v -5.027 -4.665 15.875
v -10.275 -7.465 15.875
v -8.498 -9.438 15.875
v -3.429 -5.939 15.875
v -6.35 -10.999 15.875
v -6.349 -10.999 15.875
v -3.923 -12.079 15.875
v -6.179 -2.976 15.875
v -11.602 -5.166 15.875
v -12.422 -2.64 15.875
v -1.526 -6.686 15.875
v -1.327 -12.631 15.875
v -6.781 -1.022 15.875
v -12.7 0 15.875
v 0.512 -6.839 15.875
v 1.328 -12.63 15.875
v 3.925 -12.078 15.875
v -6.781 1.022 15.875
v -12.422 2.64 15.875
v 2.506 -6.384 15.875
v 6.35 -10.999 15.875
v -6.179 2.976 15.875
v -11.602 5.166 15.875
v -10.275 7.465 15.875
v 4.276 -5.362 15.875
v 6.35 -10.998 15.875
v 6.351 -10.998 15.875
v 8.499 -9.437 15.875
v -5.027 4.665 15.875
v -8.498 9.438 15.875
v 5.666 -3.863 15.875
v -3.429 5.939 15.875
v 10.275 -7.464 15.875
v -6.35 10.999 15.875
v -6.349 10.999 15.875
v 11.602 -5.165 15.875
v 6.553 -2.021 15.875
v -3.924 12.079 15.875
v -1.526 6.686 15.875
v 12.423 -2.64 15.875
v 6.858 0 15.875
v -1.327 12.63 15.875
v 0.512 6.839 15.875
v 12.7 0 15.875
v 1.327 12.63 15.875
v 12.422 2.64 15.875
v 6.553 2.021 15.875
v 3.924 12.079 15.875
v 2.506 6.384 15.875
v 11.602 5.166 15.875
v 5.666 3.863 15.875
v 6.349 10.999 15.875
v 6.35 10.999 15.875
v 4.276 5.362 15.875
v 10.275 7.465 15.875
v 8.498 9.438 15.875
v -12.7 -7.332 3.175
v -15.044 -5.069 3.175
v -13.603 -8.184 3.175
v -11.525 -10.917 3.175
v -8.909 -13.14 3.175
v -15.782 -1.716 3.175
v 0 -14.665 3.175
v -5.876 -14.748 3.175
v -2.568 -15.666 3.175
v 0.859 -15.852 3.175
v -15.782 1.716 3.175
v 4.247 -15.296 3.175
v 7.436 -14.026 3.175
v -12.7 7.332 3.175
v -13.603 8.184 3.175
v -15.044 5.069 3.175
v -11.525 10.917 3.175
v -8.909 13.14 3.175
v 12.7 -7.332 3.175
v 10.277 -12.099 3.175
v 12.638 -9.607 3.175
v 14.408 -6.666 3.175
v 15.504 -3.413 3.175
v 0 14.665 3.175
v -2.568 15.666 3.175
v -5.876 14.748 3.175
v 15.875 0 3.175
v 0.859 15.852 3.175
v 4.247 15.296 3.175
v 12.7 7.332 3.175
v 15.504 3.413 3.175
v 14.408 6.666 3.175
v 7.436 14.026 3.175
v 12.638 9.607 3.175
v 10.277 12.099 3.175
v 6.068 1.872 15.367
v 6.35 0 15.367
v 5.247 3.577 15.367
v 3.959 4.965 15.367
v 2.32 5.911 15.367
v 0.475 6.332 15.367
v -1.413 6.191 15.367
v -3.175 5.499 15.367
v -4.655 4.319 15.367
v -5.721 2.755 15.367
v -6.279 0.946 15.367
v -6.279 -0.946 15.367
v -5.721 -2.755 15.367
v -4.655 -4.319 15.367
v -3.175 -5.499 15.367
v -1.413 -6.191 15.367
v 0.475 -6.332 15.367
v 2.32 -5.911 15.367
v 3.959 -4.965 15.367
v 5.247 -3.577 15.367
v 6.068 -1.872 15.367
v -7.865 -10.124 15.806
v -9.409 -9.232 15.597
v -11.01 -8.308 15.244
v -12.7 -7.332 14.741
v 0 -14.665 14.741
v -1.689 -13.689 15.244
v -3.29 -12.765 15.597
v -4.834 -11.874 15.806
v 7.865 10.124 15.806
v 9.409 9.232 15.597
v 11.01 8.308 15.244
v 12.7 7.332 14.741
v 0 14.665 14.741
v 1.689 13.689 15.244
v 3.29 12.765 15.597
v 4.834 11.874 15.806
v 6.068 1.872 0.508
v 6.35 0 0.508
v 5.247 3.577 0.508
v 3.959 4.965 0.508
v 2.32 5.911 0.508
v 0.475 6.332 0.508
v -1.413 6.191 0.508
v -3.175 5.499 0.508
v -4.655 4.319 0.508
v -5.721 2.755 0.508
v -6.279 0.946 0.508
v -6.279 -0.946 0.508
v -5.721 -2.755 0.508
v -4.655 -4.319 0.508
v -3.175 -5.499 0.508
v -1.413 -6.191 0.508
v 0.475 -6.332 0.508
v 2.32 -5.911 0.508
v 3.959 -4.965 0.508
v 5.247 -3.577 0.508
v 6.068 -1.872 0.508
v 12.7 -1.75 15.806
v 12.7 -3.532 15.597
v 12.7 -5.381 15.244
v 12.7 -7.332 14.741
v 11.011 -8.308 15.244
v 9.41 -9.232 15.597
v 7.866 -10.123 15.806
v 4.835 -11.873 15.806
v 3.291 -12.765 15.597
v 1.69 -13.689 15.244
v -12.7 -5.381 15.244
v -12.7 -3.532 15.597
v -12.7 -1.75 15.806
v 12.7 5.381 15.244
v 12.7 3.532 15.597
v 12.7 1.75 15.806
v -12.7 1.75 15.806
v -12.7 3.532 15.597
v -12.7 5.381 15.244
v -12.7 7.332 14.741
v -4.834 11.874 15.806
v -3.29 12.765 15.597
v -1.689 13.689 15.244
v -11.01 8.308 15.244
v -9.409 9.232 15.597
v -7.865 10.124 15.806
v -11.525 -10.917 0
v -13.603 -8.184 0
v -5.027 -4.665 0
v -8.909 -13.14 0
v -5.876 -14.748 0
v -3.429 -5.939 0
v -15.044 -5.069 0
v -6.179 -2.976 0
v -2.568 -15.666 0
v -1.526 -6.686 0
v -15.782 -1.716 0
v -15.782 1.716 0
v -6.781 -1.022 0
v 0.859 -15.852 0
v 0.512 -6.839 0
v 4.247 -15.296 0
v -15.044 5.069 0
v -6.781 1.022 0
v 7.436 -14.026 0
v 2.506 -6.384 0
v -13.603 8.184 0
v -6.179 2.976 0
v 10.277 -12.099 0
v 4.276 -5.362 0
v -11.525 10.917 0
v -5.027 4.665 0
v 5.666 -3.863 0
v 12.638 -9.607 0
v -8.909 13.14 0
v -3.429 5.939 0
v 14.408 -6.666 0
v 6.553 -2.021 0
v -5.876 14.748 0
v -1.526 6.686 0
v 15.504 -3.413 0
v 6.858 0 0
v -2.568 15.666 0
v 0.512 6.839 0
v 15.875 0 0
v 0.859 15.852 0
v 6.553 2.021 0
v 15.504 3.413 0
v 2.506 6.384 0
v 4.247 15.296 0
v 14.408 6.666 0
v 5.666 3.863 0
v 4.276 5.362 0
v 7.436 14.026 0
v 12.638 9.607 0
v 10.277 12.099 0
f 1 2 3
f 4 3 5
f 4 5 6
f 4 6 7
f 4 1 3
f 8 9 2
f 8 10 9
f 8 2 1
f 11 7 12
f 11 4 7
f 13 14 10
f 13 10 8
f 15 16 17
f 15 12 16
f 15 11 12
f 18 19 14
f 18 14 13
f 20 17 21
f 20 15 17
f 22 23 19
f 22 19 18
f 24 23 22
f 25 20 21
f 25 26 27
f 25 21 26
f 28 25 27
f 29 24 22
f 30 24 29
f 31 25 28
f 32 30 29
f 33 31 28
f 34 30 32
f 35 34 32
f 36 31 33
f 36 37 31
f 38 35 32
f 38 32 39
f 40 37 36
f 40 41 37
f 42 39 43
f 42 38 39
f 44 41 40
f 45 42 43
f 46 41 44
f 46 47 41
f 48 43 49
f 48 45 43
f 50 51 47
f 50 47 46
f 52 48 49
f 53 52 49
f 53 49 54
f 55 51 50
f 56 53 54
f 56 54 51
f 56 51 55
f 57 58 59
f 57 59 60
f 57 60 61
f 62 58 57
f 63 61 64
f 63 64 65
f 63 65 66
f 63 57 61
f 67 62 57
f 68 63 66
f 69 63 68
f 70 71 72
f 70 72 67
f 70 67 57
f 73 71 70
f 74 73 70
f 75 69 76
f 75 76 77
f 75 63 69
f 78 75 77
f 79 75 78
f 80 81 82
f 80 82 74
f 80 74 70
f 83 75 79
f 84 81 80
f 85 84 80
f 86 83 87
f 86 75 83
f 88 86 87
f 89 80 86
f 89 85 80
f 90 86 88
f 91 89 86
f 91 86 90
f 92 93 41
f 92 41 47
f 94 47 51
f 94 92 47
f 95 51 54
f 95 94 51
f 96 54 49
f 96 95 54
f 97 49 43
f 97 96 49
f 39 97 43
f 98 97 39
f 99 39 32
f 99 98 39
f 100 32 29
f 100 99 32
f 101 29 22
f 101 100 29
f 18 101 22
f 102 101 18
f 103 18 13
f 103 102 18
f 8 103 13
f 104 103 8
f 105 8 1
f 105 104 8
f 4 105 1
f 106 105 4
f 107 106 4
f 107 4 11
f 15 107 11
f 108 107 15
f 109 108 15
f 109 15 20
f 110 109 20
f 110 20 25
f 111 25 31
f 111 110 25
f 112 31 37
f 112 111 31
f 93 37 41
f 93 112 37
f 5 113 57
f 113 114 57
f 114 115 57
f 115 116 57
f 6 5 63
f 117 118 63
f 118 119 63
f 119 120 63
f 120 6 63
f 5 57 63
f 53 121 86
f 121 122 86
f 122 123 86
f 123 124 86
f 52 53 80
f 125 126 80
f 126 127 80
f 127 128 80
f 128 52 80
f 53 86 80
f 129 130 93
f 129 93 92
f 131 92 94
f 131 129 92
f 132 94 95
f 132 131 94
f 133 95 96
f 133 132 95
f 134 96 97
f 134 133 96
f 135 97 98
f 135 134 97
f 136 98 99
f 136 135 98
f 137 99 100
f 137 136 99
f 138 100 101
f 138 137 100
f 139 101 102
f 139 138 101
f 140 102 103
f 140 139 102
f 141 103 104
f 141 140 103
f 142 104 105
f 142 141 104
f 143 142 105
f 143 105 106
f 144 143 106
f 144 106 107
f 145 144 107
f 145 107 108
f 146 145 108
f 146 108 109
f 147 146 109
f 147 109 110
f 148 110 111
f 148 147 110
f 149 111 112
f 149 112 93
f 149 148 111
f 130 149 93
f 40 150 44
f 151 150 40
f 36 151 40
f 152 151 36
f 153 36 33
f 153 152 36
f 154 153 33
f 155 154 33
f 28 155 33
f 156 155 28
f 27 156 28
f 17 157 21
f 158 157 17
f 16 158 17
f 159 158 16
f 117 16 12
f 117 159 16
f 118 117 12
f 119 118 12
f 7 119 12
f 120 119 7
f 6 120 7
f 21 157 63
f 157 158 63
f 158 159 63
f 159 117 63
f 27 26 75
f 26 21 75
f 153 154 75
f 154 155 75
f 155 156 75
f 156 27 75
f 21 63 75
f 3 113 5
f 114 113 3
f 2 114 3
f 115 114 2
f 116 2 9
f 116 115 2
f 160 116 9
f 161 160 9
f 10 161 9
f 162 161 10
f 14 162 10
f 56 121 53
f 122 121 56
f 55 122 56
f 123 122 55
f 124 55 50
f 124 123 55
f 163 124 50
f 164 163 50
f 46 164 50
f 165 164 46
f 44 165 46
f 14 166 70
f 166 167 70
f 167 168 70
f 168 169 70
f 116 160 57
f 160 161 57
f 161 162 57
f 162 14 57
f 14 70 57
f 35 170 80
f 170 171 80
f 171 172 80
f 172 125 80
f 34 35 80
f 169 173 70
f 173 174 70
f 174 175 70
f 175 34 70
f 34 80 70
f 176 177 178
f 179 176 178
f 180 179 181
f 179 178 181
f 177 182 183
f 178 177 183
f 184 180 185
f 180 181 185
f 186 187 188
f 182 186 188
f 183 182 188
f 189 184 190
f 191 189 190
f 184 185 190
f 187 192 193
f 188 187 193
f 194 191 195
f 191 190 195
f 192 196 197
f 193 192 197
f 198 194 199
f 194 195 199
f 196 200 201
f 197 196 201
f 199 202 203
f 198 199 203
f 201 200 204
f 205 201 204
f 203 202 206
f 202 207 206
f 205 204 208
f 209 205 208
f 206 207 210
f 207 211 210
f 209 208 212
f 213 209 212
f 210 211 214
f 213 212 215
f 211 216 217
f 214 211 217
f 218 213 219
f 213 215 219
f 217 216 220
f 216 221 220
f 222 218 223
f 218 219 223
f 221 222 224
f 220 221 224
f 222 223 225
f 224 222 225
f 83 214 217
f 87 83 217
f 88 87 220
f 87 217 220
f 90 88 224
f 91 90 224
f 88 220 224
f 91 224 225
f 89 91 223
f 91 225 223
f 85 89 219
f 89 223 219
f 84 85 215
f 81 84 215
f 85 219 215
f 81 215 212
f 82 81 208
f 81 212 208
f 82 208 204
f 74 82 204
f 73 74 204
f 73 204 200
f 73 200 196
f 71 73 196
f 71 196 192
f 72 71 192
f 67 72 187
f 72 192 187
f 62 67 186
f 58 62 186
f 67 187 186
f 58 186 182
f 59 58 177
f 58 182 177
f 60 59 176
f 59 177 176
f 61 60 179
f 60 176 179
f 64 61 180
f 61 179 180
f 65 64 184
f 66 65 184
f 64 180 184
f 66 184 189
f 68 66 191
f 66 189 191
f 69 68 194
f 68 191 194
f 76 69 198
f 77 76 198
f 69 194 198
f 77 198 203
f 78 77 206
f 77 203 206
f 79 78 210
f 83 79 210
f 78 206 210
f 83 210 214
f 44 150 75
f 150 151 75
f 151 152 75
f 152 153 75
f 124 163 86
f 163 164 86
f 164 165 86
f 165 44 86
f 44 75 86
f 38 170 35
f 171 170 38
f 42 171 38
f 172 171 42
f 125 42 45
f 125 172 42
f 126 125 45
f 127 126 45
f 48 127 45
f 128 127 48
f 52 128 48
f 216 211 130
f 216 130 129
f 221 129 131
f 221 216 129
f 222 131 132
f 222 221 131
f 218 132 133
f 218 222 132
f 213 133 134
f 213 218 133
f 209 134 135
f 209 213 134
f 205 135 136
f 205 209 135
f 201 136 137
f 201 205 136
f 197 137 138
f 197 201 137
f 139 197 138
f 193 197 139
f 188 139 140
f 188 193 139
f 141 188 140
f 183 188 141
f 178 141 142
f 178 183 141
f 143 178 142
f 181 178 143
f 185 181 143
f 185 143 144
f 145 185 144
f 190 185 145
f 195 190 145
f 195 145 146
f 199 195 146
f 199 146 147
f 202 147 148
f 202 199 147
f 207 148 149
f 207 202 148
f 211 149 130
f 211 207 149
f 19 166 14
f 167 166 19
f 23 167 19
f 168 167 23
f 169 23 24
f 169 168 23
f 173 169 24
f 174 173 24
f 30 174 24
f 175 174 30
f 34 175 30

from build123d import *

# Parameters (mm, degrees)
F0_R     = 6.35
F1_DEPTH = 15.875
F4_R     = 15.875
F4_R_2   = 6.35
F5_DEPTH = 3.175
F6_SIZE  = 0.508


with BuildPart() as f1:
    # F0 (on Top) → F1 (new body)
    with BuildSketch(Plane.XY):
        Polygon((12.7, -7.332348), (12.7, 7.332348), (0, 14.664697), (-12.7, 7.332348), (-12.7, -7.332348), (0, -14.664697), align=None)
        Circle(F0_R, mode=Mode.SUBTRACT)
    extrude(amount=F1_DEPTH)

    # F2 (on Front) → F3 (revolve, cut)
    with BuildSketch(Plane.XZ):
        Polygon((16.705426, 15.875), (12.7, 15.875), (16.705426, 13.562466), align=None)
    revolve(axis=Axis((0, 0, 7.953254), (0, 0, -1)), mode=Mode.SUBTRACT)

    # F4 (on Top) → F5 (join)
    with BuildSketch(Plane.XY):
        Circle(F4_R)
        Circle(F4_R_2, mode=Mode.SUBTRACT)
    extrude(amount=F5_DEPTH)

    # F6
    f6_edges = [f1.edges().sort_by_distance(p)[0] for p in [
        (-6.35, 0, 0),
        (-6.35, 0, 15.875),
    ]]
    chamfer(f6_edges, length=F6_SIZE)


solid = f1.part
